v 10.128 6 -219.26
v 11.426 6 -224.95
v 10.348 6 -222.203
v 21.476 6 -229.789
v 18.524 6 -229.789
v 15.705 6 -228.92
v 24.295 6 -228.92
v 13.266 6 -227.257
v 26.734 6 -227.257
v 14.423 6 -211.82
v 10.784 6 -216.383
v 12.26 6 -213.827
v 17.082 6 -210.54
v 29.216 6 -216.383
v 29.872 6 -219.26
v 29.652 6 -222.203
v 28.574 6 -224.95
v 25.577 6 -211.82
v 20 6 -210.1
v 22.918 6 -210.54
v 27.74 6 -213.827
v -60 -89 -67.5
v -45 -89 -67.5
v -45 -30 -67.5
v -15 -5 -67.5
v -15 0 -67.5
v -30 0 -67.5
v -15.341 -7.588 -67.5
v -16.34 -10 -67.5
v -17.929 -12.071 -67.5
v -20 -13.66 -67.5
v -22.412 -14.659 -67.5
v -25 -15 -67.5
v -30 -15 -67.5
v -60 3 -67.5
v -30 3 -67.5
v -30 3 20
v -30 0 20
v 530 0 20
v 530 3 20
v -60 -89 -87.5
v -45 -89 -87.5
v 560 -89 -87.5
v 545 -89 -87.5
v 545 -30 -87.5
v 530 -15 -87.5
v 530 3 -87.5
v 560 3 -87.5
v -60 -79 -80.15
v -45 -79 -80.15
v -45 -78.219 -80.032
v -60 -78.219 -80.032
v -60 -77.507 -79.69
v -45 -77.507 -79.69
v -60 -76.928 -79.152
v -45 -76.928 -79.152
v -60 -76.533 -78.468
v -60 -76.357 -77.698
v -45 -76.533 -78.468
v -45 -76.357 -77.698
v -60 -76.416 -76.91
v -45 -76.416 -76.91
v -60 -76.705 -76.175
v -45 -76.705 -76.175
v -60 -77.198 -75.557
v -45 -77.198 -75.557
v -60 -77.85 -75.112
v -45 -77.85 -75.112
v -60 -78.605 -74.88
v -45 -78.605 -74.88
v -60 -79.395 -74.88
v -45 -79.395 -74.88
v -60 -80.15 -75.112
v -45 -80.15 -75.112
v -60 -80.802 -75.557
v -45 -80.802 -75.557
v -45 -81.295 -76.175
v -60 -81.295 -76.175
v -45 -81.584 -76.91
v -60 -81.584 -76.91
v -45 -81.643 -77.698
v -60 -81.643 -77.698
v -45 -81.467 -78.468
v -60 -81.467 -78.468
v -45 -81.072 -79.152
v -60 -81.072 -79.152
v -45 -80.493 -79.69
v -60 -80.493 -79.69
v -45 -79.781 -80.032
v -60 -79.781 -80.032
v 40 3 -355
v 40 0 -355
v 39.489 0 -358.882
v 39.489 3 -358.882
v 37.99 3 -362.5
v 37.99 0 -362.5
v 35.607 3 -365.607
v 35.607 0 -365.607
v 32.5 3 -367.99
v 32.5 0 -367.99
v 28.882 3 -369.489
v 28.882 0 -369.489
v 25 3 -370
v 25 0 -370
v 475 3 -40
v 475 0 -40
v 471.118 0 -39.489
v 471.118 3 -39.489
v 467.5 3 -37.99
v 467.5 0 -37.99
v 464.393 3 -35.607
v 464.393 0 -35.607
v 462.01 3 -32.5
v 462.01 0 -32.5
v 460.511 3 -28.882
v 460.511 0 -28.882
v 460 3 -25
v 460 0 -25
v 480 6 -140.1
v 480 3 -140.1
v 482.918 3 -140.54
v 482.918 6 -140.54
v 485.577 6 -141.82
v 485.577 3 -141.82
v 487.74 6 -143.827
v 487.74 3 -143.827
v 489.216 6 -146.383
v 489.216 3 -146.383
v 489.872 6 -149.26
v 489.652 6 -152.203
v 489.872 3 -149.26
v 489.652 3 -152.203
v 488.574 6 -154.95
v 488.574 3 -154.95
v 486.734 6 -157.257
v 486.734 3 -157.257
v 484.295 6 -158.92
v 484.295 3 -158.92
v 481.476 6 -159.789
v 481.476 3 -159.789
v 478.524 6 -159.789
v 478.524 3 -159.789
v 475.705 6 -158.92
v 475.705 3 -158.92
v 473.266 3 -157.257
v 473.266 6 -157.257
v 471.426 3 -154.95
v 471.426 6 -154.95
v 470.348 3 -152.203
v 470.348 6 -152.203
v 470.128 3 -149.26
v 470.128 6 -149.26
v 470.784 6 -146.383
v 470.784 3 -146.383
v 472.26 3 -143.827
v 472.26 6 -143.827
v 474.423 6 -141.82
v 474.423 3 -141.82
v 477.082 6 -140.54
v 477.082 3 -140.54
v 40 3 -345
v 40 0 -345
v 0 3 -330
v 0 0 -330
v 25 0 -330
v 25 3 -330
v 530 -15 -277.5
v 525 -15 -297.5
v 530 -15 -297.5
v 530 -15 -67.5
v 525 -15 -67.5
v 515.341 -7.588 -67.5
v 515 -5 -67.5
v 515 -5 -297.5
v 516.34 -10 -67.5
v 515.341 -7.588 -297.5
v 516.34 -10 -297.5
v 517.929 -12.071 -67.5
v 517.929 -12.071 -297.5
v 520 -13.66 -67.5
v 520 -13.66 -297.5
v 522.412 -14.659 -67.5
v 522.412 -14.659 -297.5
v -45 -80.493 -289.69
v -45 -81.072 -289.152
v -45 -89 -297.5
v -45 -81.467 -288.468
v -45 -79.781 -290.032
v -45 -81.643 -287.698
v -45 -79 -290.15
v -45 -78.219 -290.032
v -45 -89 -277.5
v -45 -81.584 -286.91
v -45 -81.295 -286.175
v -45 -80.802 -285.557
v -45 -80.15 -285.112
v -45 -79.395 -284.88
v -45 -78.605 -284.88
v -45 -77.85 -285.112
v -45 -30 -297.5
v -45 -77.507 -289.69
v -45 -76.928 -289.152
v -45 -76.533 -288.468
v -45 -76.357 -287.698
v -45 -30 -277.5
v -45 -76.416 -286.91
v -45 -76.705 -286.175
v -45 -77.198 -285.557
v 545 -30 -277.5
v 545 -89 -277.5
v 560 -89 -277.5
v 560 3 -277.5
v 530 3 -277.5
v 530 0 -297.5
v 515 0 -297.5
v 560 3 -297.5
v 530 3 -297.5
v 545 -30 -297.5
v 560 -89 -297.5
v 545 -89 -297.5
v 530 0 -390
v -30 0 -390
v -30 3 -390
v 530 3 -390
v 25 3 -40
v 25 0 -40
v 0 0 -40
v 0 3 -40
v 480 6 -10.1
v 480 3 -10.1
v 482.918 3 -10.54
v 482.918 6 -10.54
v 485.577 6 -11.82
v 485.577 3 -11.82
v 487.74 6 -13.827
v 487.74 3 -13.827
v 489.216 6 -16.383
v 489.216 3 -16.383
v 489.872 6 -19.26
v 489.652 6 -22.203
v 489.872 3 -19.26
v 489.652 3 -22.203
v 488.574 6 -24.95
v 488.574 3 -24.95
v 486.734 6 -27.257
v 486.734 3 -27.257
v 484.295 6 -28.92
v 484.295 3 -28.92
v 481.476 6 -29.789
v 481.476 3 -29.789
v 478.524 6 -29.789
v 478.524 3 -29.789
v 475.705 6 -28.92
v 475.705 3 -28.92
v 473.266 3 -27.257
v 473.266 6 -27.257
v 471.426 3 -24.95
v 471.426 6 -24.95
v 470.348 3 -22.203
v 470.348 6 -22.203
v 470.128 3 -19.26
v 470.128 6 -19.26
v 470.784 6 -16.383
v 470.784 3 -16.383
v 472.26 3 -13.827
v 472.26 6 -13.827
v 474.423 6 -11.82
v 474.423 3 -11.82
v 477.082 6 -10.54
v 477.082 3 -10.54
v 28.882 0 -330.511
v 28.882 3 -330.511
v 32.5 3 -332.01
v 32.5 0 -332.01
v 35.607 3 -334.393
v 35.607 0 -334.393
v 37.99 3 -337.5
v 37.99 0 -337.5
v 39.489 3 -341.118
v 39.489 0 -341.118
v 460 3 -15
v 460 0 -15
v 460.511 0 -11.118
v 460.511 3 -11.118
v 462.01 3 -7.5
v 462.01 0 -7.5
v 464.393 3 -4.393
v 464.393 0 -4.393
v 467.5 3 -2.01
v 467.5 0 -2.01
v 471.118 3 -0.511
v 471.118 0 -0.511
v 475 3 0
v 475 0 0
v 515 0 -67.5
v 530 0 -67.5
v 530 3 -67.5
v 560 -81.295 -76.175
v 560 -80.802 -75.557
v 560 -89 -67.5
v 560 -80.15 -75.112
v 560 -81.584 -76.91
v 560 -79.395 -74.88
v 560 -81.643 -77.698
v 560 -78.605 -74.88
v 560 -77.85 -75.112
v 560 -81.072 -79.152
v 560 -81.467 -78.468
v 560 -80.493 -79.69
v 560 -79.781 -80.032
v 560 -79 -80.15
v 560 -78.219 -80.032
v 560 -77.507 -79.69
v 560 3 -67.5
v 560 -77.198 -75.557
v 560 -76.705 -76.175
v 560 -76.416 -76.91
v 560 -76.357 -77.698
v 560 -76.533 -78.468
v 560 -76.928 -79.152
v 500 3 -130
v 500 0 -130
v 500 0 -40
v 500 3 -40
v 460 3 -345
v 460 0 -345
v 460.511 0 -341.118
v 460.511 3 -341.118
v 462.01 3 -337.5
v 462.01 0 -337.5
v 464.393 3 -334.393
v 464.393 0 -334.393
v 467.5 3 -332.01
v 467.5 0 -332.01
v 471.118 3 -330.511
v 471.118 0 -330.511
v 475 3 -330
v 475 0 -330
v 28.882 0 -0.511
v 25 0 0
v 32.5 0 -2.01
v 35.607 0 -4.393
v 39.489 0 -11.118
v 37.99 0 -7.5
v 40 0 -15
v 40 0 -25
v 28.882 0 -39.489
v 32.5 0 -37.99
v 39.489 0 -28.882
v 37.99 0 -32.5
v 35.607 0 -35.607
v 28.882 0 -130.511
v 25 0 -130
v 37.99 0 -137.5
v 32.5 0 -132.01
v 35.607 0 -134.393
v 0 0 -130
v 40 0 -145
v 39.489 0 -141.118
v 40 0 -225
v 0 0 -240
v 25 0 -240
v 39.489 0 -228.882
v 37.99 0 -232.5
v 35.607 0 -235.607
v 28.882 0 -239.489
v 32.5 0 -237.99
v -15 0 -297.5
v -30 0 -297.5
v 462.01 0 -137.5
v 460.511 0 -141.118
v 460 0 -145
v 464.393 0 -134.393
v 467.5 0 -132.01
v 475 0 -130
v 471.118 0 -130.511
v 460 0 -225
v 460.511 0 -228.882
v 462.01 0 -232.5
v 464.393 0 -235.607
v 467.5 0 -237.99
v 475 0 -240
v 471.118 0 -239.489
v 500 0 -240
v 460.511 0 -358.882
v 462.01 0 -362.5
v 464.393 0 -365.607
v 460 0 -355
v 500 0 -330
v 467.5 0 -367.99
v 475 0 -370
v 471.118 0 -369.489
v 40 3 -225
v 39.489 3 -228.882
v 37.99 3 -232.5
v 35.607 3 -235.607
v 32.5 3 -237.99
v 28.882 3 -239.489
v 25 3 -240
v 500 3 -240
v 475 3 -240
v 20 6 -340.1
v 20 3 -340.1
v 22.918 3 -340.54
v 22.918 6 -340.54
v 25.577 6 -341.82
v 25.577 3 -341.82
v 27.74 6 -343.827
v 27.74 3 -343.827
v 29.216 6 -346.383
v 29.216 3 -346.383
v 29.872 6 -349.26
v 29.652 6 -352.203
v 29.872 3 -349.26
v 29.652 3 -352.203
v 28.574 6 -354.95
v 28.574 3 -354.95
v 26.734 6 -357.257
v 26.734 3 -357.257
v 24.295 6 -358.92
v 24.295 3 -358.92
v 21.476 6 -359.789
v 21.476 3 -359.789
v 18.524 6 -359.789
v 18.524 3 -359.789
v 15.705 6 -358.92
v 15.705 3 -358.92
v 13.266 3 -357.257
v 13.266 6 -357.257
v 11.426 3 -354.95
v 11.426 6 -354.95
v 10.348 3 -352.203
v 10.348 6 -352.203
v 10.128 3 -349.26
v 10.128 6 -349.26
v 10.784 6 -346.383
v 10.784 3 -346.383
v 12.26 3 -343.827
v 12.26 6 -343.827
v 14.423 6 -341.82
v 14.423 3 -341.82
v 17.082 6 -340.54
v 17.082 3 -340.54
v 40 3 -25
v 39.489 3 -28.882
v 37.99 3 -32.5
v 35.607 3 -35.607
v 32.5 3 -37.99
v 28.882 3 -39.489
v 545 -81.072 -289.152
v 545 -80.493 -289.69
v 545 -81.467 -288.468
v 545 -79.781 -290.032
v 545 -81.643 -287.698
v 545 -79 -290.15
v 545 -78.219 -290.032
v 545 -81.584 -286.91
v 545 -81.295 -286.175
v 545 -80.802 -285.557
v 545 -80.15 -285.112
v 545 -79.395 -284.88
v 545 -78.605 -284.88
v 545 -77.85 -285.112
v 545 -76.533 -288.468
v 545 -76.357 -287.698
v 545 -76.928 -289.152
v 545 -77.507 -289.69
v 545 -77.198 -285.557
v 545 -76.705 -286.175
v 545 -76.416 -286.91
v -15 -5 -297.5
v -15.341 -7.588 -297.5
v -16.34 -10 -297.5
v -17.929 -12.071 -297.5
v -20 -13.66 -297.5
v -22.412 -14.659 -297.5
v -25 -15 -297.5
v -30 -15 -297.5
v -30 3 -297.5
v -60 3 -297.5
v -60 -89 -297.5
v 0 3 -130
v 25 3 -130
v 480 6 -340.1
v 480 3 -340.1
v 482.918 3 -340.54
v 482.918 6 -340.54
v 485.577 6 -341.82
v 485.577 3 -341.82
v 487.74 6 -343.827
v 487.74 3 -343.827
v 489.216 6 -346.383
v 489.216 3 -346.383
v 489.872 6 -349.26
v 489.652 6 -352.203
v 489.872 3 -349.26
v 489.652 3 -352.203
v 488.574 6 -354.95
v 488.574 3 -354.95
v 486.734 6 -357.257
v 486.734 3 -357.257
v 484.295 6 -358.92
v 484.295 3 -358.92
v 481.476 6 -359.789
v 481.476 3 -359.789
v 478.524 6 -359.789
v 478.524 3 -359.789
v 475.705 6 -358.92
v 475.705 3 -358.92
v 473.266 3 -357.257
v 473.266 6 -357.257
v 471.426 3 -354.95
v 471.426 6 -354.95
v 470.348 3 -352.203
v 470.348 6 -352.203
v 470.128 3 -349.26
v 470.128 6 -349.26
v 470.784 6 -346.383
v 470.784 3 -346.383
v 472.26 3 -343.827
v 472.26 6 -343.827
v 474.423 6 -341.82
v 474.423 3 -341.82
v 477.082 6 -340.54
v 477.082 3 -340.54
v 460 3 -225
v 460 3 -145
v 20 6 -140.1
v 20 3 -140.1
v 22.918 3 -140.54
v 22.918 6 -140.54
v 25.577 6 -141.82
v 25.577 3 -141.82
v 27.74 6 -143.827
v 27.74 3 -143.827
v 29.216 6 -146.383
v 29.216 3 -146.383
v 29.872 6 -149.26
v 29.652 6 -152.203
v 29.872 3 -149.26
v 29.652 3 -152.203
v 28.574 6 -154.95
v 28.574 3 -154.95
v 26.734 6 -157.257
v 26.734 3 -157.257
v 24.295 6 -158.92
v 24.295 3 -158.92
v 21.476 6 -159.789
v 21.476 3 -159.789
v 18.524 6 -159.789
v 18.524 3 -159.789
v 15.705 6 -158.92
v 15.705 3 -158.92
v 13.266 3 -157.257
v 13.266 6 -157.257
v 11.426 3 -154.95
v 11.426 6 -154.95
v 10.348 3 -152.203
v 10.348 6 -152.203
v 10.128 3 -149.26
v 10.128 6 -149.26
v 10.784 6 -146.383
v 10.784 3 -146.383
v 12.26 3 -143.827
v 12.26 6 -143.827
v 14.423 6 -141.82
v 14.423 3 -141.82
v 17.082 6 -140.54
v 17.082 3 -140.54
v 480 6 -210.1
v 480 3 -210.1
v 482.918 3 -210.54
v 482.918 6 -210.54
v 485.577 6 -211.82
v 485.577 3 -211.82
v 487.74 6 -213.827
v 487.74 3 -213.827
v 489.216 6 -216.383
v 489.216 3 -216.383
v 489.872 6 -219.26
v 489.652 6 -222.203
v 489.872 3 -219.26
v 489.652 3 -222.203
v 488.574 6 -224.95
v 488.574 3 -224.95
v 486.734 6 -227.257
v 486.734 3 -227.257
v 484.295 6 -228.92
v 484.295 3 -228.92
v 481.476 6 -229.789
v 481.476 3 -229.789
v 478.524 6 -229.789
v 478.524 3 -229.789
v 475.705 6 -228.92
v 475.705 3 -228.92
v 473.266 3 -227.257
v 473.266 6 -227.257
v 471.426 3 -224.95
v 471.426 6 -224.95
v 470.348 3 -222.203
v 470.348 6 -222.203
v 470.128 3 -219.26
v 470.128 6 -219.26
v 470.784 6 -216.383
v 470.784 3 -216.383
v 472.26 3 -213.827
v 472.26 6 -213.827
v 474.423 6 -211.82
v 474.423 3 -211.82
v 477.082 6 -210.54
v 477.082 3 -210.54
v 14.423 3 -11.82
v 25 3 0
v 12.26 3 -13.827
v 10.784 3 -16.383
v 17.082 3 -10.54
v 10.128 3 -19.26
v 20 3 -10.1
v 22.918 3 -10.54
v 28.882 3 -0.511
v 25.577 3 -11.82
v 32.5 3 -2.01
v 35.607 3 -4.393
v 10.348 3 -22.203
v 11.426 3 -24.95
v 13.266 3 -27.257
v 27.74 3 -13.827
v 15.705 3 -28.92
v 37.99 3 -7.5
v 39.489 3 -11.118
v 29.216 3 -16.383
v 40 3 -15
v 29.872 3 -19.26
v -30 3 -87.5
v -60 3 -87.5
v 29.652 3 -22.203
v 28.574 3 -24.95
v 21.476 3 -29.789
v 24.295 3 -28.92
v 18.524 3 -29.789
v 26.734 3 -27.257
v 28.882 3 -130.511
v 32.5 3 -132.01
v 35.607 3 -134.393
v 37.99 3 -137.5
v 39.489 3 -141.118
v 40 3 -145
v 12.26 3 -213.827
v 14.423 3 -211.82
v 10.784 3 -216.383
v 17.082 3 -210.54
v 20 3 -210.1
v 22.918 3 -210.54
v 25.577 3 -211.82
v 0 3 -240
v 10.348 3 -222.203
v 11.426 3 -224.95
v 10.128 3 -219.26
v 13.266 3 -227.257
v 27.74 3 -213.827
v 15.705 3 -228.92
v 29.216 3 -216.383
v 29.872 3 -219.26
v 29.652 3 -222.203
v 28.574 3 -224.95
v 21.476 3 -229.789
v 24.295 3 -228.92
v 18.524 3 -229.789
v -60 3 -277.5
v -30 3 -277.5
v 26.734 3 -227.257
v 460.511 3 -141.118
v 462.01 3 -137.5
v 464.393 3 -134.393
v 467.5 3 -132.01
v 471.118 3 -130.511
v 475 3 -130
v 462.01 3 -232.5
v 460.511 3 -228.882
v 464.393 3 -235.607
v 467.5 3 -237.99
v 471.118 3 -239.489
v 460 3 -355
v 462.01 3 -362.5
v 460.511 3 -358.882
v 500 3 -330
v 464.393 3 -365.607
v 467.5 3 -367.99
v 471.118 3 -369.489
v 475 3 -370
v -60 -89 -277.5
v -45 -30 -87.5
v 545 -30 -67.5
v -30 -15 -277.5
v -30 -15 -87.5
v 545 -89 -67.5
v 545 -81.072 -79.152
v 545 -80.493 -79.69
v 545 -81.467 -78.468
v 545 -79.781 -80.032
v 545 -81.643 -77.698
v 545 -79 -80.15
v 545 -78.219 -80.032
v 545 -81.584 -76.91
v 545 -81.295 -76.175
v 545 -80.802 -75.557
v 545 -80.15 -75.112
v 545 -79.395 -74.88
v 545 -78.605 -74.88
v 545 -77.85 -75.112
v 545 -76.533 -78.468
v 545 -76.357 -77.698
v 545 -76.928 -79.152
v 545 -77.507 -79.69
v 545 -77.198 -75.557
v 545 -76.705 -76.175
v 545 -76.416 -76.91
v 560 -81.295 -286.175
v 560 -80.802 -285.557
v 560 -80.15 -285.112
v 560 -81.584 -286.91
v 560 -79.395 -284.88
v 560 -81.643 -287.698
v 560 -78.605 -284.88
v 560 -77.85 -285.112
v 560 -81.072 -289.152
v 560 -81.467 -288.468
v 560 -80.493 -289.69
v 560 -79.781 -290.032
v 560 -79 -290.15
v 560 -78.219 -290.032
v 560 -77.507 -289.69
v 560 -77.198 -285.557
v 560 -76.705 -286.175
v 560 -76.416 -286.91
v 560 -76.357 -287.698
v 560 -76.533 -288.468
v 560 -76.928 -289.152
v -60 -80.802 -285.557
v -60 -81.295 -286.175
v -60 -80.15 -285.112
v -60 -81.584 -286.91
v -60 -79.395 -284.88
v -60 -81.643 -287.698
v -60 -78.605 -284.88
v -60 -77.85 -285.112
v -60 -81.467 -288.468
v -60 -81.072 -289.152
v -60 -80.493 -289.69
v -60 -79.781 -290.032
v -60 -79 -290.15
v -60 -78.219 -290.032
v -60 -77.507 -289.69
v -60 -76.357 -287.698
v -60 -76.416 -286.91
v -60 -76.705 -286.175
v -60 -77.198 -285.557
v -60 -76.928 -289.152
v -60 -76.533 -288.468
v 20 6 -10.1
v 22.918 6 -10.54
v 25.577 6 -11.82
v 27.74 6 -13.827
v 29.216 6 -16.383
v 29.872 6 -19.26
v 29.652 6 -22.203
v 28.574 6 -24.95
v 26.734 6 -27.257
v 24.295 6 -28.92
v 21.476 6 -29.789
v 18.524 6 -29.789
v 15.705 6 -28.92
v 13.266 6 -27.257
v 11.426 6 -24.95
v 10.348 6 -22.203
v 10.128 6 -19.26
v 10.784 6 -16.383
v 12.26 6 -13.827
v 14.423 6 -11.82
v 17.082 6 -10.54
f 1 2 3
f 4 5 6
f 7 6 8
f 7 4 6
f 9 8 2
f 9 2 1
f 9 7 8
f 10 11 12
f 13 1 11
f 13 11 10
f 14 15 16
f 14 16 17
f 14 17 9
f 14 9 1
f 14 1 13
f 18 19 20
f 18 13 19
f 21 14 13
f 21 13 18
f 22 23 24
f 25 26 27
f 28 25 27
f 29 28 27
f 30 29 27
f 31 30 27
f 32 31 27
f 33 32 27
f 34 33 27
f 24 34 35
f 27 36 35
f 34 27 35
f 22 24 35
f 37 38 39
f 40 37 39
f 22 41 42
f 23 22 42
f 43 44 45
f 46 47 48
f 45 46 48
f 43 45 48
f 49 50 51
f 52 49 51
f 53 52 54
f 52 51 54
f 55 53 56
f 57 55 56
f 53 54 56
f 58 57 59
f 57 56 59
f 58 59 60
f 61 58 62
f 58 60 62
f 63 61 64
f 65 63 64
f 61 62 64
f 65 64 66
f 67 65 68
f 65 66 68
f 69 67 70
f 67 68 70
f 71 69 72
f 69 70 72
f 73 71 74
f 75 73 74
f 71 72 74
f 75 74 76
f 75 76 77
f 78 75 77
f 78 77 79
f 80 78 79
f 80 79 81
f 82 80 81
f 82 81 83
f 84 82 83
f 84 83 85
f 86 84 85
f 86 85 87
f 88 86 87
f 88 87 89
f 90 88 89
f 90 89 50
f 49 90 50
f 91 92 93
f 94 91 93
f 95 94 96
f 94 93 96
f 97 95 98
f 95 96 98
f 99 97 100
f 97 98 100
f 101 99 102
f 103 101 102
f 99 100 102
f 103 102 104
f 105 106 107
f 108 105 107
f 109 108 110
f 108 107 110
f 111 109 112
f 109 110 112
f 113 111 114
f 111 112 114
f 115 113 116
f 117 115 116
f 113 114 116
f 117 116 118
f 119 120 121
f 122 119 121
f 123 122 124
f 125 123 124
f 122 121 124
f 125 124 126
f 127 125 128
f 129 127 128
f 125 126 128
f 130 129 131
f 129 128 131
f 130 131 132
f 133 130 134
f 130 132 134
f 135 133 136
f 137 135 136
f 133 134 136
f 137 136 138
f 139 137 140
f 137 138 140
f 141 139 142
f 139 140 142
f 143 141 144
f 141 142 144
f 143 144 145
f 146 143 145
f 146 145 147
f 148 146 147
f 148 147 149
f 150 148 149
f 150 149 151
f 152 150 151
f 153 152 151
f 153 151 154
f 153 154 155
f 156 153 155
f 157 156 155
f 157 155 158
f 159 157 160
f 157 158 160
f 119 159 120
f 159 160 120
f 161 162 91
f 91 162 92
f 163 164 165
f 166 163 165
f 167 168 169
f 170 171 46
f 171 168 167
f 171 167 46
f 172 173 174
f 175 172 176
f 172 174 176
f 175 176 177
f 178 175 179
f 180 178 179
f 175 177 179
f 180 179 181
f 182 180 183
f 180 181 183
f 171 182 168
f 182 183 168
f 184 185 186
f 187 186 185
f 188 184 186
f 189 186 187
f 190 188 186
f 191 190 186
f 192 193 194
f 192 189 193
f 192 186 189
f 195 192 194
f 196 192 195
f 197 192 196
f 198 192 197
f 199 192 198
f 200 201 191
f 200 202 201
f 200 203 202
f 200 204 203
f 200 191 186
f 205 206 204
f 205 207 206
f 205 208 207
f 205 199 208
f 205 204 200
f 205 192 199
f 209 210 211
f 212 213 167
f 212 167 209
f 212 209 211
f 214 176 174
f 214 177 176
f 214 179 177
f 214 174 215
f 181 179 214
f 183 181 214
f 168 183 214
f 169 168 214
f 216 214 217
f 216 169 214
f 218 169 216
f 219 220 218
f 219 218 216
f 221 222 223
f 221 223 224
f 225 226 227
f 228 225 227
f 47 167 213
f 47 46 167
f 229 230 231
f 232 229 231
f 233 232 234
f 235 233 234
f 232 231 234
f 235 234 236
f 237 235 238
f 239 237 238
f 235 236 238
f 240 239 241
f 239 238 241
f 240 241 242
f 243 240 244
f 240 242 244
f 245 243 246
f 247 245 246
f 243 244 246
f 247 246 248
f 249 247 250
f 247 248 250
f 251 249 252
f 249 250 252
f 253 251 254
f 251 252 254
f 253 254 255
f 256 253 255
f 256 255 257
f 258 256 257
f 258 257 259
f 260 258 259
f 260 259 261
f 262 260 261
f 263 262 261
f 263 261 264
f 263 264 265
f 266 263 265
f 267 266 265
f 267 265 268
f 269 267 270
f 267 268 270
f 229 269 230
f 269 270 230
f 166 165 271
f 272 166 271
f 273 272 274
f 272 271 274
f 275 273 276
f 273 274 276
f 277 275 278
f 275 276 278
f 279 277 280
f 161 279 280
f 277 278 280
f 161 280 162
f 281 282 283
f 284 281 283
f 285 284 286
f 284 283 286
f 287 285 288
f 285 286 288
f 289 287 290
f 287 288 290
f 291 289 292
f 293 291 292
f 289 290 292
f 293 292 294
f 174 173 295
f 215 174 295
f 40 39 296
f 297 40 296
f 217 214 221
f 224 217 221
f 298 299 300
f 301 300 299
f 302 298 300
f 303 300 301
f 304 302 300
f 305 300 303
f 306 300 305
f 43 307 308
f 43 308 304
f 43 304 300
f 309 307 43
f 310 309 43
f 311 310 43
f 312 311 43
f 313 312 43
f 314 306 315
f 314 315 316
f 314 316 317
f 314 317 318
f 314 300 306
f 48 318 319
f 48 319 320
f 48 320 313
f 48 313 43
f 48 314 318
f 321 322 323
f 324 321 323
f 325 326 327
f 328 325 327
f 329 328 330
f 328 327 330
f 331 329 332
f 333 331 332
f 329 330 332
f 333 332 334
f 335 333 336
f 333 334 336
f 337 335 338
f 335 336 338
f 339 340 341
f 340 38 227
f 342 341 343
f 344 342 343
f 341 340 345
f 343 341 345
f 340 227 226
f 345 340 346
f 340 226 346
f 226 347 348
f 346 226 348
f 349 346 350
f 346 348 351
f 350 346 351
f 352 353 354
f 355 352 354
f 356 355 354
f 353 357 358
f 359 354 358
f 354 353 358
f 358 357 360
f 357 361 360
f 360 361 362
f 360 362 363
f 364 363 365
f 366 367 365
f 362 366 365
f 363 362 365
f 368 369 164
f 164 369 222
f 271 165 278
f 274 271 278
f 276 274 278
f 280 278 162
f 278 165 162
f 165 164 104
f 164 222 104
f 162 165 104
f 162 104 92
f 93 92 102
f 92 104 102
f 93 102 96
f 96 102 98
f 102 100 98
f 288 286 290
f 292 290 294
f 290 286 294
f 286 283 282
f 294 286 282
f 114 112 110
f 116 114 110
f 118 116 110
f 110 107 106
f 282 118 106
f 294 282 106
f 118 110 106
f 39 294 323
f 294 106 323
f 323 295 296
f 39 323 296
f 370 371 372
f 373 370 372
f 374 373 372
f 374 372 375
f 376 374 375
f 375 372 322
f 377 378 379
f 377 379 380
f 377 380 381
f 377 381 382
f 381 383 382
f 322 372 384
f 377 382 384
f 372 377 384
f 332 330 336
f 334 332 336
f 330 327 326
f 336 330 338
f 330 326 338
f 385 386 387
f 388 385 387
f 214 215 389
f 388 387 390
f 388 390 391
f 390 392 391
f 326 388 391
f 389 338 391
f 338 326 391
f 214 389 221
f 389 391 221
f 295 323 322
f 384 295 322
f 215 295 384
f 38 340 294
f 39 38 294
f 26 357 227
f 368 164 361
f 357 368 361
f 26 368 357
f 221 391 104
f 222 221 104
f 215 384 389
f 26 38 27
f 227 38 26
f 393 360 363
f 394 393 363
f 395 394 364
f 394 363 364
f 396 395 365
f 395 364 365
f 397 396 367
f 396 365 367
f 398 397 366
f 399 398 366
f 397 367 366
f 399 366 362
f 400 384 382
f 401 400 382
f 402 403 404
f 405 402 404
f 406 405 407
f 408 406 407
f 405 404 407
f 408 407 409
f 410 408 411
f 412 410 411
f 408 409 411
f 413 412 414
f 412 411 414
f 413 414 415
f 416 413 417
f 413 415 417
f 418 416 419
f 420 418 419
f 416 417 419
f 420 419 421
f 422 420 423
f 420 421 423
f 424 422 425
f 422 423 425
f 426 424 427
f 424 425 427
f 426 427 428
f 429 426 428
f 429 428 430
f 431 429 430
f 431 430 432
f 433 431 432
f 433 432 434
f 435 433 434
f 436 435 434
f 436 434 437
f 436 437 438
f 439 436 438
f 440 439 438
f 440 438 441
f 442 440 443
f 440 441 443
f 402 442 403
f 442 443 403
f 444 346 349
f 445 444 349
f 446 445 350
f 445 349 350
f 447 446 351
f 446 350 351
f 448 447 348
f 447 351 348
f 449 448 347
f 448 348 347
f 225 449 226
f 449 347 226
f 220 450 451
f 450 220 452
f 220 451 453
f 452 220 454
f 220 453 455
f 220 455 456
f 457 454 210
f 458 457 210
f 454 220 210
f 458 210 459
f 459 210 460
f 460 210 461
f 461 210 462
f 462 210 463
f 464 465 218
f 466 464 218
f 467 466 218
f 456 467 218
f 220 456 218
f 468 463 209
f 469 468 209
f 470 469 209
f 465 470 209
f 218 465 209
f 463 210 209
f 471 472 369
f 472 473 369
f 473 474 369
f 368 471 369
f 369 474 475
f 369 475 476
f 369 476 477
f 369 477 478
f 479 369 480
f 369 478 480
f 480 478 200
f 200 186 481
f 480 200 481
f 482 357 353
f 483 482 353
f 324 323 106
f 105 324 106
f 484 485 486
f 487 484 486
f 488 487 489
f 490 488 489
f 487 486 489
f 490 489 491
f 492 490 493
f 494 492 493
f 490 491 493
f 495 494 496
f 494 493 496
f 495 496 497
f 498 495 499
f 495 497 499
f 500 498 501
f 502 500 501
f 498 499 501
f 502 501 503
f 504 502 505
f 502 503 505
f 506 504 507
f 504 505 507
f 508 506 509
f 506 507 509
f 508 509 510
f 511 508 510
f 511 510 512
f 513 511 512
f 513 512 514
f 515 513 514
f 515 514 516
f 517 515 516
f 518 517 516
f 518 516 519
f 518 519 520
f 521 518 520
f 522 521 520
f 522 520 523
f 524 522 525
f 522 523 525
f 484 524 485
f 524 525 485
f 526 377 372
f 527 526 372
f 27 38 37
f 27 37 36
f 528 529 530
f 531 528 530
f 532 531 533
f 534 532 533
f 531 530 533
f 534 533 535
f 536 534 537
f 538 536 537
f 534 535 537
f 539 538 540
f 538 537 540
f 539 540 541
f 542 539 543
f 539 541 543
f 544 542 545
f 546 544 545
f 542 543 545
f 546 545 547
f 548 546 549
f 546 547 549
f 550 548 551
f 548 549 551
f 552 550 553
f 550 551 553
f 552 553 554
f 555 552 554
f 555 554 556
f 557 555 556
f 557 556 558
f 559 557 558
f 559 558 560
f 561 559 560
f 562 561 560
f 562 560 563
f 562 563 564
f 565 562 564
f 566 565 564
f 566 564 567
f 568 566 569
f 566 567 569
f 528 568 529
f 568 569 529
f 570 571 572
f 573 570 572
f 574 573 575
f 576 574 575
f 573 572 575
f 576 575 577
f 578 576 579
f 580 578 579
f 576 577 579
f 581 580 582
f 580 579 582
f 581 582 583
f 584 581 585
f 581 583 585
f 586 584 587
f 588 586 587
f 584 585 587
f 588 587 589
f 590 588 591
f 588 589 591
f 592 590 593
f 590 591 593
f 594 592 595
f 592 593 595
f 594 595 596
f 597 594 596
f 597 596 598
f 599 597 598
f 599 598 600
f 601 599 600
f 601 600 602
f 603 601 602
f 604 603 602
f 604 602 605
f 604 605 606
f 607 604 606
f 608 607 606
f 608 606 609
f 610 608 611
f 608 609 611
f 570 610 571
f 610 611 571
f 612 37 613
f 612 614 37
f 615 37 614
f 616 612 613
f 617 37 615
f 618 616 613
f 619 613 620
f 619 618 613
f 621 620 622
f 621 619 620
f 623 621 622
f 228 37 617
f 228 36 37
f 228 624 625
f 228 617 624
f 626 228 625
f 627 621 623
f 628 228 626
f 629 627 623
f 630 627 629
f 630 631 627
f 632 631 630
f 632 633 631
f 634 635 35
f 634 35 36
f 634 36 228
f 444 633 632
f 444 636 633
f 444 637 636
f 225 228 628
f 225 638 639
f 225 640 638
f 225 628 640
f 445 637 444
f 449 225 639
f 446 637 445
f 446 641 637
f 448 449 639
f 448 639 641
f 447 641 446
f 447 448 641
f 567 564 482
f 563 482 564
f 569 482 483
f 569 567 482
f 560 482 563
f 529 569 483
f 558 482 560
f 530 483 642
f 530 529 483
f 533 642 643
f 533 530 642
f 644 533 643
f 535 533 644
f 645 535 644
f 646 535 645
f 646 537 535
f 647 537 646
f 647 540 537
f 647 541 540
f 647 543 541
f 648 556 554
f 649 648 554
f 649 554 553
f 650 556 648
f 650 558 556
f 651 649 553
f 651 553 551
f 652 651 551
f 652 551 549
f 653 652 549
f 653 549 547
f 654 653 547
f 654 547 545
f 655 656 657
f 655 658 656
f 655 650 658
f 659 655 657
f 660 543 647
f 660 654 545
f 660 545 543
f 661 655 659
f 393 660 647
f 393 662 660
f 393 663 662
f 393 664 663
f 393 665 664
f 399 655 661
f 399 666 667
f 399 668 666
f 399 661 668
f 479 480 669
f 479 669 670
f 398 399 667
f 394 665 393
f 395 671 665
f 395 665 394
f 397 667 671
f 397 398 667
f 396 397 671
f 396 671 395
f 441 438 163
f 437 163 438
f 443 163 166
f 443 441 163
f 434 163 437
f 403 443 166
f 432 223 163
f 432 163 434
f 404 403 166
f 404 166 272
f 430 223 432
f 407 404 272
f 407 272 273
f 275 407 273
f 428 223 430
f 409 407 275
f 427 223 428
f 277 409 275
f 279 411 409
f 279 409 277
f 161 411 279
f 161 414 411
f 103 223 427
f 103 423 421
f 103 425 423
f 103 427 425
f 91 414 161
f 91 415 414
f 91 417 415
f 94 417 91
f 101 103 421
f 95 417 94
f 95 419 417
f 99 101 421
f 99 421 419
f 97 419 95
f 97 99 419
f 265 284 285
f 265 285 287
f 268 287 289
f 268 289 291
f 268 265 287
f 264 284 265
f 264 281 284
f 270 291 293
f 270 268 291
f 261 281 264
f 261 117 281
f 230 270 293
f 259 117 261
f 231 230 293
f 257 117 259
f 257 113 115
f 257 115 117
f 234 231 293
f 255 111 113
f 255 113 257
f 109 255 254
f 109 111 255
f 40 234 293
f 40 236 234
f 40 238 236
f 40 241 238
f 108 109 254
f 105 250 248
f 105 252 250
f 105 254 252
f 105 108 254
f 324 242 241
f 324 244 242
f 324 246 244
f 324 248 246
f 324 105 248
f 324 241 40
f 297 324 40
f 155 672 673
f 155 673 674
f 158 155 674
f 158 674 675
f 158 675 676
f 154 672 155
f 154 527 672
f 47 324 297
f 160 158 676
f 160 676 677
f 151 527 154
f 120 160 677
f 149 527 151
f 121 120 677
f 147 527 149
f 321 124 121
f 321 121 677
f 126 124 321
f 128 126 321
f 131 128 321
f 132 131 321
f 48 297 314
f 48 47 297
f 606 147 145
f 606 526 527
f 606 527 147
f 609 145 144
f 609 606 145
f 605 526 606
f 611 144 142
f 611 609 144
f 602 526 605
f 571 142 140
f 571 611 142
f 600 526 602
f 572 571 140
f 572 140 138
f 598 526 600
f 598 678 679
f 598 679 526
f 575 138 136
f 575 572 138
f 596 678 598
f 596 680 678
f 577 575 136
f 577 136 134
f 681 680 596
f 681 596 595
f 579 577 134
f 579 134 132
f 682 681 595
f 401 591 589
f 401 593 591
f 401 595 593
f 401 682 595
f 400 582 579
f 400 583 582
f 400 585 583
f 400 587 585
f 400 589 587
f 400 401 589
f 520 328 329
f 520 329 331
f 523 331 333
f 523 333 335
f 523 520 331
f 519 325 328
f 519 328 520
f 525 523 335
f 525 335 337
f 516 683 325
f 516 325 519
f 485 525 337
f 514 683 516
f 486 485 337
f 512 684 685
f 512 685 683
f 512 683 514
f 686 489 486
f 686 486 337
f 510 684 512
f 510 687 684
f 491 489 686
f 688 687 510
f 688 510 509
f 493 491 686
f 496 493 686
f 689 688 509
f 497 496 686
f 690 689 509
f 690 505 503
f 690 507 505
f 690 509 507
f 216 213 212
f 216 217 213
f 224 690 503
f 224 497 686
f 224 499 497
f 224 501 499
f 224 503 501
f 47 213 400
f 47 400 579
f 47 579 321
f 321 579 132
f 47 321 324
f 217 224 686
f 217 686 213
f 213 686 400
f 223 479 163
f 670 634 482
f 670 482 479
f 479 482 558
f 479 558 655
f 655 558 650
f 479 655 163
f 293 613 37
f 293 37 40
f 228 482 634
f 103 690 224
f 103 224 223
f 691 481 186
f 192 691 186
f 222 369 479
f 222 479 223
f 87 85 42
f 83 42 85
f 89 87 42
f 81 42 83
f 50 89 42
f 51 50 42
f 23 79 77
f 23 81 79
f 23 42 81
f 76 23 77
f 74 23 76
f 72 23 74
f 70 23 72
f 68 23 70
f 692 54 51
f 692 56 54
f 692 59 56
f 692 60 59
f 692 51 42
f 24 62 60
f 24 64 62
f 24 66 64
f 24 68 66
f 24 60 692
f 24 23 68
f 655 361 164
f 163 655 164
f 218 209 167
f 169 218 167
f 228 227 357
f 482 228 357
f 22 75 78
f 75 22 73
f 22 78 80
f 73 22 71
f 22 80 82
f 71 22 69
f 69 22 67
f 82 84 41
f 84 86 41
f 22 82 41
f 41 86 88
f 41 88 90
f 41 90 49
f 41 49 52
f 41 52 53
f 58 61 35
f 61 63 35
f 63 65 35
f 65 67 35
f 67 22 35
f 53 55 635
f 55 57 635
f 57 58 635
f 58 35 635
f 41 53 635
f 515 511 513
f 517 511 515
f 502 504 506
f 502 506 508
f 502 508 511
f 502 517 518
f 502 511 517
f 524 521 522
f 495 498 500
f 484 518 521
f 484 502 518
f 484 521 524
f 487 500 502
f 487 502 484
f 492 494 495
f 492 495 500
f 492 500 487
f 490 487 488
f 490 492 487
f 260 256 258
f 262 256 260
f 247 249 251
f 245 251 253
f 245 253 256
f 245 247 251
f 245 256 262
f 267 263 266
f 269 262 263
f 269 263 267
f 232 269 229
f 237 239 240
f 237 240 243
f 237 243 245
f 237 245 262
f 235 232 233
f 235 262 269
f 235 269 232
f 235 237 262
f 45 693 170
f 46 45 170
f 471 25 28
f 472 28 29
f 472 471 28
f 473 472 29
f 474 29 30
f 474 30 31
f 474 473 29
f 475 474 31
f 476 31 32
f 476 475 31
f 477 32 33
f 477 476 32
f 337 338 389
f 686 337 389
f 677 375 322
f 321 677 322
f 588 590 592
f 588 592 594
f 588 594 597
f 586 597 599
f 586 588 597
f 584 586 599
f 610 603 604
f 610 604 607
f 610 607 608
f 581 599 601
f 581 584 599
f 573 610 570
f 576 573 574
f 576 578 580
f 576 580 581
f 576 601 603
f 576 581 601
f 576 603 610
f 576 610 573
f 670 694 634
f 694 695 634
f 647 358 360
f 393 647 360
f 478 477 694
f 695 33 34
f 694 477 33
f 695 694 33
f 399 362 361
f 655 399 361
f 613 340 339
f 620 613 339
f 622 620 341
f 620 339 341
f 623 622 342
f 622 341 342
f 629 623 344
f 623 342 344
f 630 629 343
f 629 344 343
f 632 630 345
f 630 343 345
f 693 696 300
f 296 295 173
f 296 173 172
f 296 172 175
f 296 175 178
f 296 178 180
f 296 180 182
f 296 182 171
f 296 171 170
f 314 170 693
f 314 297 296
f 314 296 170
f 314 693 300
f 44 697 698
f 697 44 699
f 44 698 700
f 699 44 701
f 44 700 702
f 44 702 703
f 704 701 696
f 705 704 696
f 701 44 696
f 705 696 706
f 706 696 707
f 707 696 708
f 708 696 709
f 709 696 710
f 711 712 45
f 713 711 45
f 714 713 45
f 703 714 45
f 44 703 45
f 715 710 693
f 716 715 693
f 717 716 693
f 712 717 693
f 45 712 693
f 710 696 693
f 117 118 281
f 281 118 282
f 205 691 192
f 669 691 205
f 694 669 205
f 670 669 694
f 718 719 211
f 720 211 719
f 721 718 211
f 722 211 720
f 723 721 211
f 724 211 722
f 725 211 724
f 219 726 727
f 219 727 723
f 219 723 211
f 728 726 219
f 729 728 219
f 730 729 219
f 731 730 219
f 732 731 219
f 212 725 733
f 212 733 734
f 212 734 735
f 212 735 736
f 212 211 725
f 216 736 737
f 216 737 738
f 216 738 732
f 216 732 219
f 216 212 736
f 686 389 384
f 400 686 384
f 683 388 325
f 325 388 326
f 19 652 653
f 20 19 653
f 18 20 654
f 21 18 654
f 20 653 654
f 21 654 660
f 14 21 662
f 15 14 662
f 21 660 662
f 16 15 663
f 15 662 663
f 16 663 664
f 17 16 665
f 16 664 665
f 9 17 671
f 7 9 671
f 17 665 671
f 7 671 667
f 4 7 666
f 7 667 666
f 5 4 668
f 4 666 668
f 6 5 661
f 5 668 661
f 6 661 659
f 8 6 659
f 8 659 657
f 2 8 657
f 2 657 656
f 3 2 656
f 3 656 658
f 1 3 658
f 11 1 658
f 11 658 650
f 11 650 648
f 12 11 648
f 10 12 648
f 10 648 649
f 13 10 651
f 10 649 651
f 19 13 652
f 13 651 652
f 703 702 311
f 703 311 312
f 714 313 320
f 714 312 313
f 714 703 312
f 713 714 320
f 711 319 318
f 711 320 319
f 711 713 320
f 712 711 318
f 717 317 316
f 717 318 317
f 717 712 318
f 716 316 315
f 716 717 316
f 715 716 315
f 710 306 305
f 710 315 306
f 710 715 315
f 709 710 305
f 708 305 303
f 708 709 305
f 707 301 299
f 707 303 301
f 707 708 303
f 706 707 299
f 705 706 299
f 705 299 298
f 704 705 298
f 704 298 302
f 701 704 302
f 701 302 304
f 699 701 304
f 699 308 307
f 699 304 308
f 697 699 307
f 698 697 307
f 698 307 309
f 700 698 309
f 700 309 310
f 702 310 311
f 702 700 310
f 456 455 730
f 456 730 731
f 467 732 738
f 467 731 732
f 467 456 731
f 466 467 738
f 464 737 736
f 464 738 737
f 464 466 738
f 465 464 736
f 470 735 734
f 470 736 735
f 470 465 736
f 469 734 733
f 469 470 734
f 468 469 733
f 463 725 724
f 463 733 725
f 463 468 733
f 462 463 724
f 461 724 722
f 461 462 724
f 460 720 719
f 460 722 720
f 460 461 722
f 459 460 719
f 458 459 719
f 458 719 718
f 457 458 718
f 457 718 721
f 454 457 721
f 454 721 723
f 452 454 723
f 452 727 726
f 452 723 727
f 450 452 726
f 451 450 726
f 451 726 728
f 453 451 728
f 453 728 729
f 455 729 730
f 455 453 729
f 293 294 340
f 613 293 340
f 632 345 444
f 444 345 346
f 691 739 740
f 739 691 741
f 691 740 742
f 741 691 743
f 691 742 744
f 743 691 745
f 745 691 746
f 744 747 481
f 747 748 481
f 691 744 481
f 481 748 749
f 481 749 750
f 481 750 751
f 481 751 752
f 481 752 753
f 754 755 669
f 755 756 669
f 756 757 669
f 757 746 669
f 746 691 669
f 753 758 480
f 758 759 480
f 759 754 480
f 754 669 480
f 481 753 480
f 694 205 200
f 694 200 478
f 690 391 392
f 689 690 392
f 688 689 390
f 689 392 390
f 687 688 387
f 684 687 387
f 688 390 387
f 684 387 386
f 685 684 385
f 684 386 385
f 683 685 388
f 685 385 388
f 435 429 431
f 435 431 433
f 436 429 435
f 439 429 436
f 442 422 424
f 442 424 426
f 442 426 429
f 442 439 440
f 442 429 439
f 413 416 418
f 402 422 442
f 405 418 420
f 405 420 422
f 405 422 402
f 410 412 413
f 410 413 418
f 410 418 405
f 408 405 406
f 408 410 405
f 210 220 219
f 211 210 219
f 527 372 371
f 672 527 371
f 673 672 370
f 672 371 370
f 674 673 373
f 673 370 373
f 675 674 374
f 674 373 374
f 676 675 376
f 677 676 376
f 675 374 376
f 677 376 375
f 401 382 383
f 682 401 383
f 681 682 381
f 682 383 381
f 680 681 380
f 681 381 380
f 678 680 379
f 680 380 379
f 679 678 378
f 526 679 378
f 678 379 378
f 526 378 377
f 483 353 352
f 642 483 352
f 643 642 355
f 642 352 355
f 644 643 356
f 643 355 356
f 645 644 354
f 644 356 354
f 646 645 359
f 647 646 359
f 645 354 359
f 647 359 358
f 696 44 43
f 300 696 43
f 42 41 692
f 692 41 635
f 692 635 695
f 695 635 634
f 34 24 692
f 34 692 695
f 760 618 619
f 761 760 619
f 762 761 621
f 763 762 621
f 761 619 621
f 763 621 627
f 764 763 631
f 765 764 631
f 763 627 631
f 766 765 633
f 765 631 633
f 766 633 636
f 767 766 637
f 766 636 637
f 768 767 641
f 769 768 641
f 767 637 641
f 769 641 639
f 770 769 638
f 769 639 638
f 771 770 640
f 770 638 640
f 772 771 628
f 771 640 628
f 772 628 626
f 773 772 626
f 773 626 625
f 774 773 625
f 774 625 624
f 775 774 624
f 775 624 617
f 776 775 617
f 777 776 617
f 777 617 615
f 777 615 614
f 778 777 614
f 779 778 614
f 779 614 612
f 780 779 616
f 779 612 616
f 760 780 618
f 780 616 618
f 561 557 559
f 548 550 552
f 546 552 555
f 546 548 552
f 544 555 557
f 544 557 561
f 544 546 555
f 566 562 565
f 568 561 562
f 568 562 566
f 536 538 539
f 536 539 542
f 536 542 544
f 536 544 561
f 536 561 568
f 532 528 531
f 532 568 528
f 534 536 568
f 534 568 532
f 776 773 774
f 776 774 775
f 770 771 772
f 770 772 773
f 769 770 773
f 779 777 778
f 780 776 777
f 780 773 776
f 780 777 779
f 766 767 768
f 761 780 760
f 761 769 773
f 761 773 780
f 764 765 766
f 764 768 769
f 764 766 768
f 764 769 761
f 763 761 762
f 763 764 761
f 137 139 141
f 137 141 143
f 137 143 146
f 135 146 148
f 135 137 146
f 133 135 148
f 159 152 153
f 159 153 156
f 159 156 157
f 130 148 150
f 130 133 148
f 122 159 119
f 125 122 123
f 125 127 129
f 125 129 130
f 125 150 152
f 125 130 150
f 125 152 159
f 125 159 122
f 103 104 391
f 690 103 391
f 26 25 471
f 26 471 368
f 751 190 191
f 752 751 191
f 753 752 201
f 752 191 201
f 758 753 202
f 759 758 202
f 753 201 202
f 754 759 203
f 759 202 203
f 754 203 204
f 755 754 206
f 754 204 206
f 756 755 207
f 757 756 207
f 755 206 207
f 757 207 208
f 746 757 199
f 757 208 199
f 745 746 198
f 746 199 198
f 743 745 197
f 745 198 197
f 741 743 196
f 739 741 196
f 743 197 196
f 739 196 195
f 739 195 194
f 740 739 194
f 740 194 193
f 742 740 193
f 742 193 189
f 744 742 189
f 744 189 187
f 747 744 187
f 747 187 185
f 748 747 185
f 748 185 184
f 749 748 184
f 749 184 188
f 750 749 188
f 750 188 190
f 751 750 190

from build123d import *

# Parameters (mm, degrees)
SKETCH1_W            = 560
SKETCH1_H            = 410
BOSS_EXTRUDE1_DEPTH  = 3
SKETCH2_R            = 9.9
BOSS_EXTRUDE2_DEPTH  = 3
SKETCH3_W            = 30
SKETCH3_H            = 20
BOSS_EXTRUDE3_DEPTH  = 92
LPATTERN1_COUNT      = 2
LPATTERN1_PITCH      = 210
BOSS_EXTRUDE4_REACH  = 654.324
SKETCH4_W            = 15
SKETCH4_H            = 15
FILLET1_R            = 10
FILLET1_OF_MIRROR1_R = 10
SKETCH5_R            = 2.65
CUT_EXTRUDE1_DEPTH   = 92
CUT_EXTRUDE2_DEPTH   = 653.32449747


with BuildPart() as part:
    # Sketch1 → Boss-Extrude1 (new body)
    with BuildSketch(Plane(origin=(0, 0, 0), x_dir=(1, 0, 0), z_dir=(0, 1, 0))):
        with Locations((250, 185)):
            Rectangle(SKETCH1_W, SKETCH1_H)
        with BuildLine():
            Line((500, 130), (500, 40))
            Line((500, 40), (475, 40))
            ThreePointArc((475, 40), (464.393398282, 35.606601718), (460, 25))
            Line((460, 25), (460, 15))
            ThreePointArc((460, 15), (464.393398282, 4.393398282), (475, 0))
            Line((475, 0), (25, 0))
            ThreePointArc((25, 0), (35.606601718, 4.393398282), (40, 15))
            Line((40, 15), (40, 25))
            ThreePointArc((40, 25), (35.606601718, 35.606601718), (25, 40))
            Line((25, 40), (0, 40))
            Line((0, 40), (0, 130))
            Line((0, 130), (25, 130))
            ThreePointArc((25, 130), (35.606601718, 134.393398282), (40, 145))
            Line((40, 145), (40, 225))
            ThreePointArc((40, 225), (35.606601718, 235.606601718), (25, 240))
            Line((25, 240), (0, 240))
            Line((0, 240), (0, 330))
            Line((0, 330), (25, 330))
            ThreePointArc((25, 330), (35.606601718, 334.393398282), (40, 345))
            Line((40, 345), (40, 355))
            ThreePointArc((40, 355), (35.606601718, 365.606601718), (25, 370))
            Line((25, 370), (475, 370))
            ThreePointArc((475, 370), (464.393398282, 365.606601718), (460, 355))
            Line((460, 355), (460, 345))
            ThreePointArc((460, 345), (464.393398282, 334.393398282), (475, 330))
            Line((475, 330), (500, 330))
            Line((500, 330), (500, 240))
            Line((500, 240), (475, 240))
            ThreePointArc((475, 240), (464.393398282, 235.606601718), (460, 225))
            Line((460, 225), (460, 145))
            ThreePointArc((460, 145), (464.393398282, 134.393398282), (475, 130))
            Line((475, 130), (500, 130))
        make_face(mode=Mode.SUBTRACT)
    extrude(amount=BOSS_EXTRUDE1_DEPTH)

    # Sketch2 → Boss-Extrude2 (add)
    with BuildSketch(Plane(origin=(0, 3, 0), x_dir=(1, 0, 0), z_dir=(0, 1, 0))):
        with Locations(Location((20, 150, 0), (0, 0, 270))):
            Circle(SKETCH2_R)
        with Locations(Location((20, 220, 0), (0, 0, 270))):
            Circle(SKETCH2_R)
        with Locations(Location((20, 350, 0), (0, 0, 270))):
            Circle(SKETCH2_R)
        with Locations(Location((20, 20, 0), (0, 0, 270))):
            Circle(SKETCH2_R)
        with Locations(Location((480, 150, 0), (0, 0, 270))):
            Circle(SKETCH2_R)
        with Locations(Location((480, 220, 0), (0, 0, 270))):
            Circle(SKETCH2_R)
        with Locations(Location((480, 350, 0), (0, 0, 270))):
            Circle(SKETCH2_R)
        with Locations(Location((480, 20, 0), (0, 0, 270))):
            Circle(SKETCH2_R)
    extrude(amount=BOSS_EXTRUDE2_DEPTH)

    # Sketch3 → Boss-Extrude3 (add)
    with BuildSketch(Plane(origin=(0, 3, 0), x_dir=(1, 0, 0), z_dir=(0, 1, 0))):
        with Locations((545, 287.5)):
            Rectangle(SKETCH3_W, SKETCH3_H)
        with Locations((-45, 287.5)):
            Rectangle(SKETCH3_W, SKETCH3_H)
    boss_extrude3 = extrude(amount=-BOSS_EXTRUDE3_DEPTH)

    # LPattern1: Boss-Extrude3 ×2
    with Locations(*[(0, 0, i * LPATTERN1_PITCH) for i in range(1, LPATTERN1_COUNT)]):
        add(boss_extrude3)

    # Boss-Extrude4: up to this face of the body (flat: up to its plane)
    boss_extrude4_end = Plane(part.part.faces().sort_by_distance((-45, -43, -297.5))[0])
    # Sketch4 → Boss-Extrude4 (add, up to the picked face)
    with BuildSketch(Plane.XY.offset(-67.5), mode=Mode.PRIVATE) as boss_extrude4_sk1:
        with Locations((522.5, -7.5)):
            Rectangle(SKETCH4_W, SKETCH4_H)
    boss_extrude4_tool1 = split(extrude(boss_extrude4_sk1.sketch, amount=-BOSS_EXTRUDE4_REACH, mode=Mode.PRIVATE), bisect_by=boss_extrude4_end, keep=Keep.BOTH, mode=Mode.PRIVATE)
    boss_extrude4 = boss_extrude4_tool1.solids().sort_by(Axis((522.5, -7.5, -67.5), (0, 0, -1)))[0]
    add(boss_extrude4)

    # Fillet1
    fillet1_edges = [part.edges().sort_by_distance(p)[0] for p in [
        (515, -15, -182.5),
    ]]
    fillet(fillet1_edges, radius=FILLET1_R)

    # Mirror1: Boss-Extrude4 across plane
    add(boss_extrude4.mirror(Plane(origin=(250, 0, 0), x_dir=(0, 0, 1), z_dir=(1, 0, 0))))

    # Fillet1 of Mirror1
    fillet1_of_mirror1_edges = [part.edges().sort_by_distance(p)[0] for p in [
        (-15, -15, -182.5),
    ]]
    fillet(fillet1_of_mirror1_edges, radius=FILLET1_OF_MIRROR1_R)

    # Sketch5 → Cut-Extrude1 (cut)
    with BuildSketch(Plane(origin=(-30, 0, 0), x_dir=(0, 0, -1), z_dir=(1, 0, 0))):
        with Locations((77.5, -79)):
            Circle(SKETCH5_R)
        with Locations((287.5, -79)):
            Circle(SKETCH5_R)
    cut_extrude1 = extrude(amount=-CUT_EXTRUDE1_DEPTH, mode=Mode.SUBTRACT)

    # Mirror2: Cut-Extrude1 across plane
    add(cut_extrude1.mirror(Plane(origin=(250, 0, 0), x_dir=(0, 0, 1), z_dir=(1, 0, 0))), mode=Mode.SUBTRACT)

    # Sketch6 → Cut-Extrude2 (cut, through all)
    with BuildSketch(Plane.XY.offset(-67.5)):
        Polygon((-45, -89), (-45, -30), (-30, -15), (-30, -89), align=None)
    cut_extrude2 = extrude(amount=-CUT_EXTRUDE2_DEPTH, mode=Mode.SUBTRACT)

    # Mirror3: Cut-Extrude2 across plane
    add(cut_extrude2.mirror(Plane(origin=(250, 0, 0), x_dir=(0, 0, 1), z_dir=(1, 0, 0))), mode=Mode.SUBTRACT)


solid = part.part
